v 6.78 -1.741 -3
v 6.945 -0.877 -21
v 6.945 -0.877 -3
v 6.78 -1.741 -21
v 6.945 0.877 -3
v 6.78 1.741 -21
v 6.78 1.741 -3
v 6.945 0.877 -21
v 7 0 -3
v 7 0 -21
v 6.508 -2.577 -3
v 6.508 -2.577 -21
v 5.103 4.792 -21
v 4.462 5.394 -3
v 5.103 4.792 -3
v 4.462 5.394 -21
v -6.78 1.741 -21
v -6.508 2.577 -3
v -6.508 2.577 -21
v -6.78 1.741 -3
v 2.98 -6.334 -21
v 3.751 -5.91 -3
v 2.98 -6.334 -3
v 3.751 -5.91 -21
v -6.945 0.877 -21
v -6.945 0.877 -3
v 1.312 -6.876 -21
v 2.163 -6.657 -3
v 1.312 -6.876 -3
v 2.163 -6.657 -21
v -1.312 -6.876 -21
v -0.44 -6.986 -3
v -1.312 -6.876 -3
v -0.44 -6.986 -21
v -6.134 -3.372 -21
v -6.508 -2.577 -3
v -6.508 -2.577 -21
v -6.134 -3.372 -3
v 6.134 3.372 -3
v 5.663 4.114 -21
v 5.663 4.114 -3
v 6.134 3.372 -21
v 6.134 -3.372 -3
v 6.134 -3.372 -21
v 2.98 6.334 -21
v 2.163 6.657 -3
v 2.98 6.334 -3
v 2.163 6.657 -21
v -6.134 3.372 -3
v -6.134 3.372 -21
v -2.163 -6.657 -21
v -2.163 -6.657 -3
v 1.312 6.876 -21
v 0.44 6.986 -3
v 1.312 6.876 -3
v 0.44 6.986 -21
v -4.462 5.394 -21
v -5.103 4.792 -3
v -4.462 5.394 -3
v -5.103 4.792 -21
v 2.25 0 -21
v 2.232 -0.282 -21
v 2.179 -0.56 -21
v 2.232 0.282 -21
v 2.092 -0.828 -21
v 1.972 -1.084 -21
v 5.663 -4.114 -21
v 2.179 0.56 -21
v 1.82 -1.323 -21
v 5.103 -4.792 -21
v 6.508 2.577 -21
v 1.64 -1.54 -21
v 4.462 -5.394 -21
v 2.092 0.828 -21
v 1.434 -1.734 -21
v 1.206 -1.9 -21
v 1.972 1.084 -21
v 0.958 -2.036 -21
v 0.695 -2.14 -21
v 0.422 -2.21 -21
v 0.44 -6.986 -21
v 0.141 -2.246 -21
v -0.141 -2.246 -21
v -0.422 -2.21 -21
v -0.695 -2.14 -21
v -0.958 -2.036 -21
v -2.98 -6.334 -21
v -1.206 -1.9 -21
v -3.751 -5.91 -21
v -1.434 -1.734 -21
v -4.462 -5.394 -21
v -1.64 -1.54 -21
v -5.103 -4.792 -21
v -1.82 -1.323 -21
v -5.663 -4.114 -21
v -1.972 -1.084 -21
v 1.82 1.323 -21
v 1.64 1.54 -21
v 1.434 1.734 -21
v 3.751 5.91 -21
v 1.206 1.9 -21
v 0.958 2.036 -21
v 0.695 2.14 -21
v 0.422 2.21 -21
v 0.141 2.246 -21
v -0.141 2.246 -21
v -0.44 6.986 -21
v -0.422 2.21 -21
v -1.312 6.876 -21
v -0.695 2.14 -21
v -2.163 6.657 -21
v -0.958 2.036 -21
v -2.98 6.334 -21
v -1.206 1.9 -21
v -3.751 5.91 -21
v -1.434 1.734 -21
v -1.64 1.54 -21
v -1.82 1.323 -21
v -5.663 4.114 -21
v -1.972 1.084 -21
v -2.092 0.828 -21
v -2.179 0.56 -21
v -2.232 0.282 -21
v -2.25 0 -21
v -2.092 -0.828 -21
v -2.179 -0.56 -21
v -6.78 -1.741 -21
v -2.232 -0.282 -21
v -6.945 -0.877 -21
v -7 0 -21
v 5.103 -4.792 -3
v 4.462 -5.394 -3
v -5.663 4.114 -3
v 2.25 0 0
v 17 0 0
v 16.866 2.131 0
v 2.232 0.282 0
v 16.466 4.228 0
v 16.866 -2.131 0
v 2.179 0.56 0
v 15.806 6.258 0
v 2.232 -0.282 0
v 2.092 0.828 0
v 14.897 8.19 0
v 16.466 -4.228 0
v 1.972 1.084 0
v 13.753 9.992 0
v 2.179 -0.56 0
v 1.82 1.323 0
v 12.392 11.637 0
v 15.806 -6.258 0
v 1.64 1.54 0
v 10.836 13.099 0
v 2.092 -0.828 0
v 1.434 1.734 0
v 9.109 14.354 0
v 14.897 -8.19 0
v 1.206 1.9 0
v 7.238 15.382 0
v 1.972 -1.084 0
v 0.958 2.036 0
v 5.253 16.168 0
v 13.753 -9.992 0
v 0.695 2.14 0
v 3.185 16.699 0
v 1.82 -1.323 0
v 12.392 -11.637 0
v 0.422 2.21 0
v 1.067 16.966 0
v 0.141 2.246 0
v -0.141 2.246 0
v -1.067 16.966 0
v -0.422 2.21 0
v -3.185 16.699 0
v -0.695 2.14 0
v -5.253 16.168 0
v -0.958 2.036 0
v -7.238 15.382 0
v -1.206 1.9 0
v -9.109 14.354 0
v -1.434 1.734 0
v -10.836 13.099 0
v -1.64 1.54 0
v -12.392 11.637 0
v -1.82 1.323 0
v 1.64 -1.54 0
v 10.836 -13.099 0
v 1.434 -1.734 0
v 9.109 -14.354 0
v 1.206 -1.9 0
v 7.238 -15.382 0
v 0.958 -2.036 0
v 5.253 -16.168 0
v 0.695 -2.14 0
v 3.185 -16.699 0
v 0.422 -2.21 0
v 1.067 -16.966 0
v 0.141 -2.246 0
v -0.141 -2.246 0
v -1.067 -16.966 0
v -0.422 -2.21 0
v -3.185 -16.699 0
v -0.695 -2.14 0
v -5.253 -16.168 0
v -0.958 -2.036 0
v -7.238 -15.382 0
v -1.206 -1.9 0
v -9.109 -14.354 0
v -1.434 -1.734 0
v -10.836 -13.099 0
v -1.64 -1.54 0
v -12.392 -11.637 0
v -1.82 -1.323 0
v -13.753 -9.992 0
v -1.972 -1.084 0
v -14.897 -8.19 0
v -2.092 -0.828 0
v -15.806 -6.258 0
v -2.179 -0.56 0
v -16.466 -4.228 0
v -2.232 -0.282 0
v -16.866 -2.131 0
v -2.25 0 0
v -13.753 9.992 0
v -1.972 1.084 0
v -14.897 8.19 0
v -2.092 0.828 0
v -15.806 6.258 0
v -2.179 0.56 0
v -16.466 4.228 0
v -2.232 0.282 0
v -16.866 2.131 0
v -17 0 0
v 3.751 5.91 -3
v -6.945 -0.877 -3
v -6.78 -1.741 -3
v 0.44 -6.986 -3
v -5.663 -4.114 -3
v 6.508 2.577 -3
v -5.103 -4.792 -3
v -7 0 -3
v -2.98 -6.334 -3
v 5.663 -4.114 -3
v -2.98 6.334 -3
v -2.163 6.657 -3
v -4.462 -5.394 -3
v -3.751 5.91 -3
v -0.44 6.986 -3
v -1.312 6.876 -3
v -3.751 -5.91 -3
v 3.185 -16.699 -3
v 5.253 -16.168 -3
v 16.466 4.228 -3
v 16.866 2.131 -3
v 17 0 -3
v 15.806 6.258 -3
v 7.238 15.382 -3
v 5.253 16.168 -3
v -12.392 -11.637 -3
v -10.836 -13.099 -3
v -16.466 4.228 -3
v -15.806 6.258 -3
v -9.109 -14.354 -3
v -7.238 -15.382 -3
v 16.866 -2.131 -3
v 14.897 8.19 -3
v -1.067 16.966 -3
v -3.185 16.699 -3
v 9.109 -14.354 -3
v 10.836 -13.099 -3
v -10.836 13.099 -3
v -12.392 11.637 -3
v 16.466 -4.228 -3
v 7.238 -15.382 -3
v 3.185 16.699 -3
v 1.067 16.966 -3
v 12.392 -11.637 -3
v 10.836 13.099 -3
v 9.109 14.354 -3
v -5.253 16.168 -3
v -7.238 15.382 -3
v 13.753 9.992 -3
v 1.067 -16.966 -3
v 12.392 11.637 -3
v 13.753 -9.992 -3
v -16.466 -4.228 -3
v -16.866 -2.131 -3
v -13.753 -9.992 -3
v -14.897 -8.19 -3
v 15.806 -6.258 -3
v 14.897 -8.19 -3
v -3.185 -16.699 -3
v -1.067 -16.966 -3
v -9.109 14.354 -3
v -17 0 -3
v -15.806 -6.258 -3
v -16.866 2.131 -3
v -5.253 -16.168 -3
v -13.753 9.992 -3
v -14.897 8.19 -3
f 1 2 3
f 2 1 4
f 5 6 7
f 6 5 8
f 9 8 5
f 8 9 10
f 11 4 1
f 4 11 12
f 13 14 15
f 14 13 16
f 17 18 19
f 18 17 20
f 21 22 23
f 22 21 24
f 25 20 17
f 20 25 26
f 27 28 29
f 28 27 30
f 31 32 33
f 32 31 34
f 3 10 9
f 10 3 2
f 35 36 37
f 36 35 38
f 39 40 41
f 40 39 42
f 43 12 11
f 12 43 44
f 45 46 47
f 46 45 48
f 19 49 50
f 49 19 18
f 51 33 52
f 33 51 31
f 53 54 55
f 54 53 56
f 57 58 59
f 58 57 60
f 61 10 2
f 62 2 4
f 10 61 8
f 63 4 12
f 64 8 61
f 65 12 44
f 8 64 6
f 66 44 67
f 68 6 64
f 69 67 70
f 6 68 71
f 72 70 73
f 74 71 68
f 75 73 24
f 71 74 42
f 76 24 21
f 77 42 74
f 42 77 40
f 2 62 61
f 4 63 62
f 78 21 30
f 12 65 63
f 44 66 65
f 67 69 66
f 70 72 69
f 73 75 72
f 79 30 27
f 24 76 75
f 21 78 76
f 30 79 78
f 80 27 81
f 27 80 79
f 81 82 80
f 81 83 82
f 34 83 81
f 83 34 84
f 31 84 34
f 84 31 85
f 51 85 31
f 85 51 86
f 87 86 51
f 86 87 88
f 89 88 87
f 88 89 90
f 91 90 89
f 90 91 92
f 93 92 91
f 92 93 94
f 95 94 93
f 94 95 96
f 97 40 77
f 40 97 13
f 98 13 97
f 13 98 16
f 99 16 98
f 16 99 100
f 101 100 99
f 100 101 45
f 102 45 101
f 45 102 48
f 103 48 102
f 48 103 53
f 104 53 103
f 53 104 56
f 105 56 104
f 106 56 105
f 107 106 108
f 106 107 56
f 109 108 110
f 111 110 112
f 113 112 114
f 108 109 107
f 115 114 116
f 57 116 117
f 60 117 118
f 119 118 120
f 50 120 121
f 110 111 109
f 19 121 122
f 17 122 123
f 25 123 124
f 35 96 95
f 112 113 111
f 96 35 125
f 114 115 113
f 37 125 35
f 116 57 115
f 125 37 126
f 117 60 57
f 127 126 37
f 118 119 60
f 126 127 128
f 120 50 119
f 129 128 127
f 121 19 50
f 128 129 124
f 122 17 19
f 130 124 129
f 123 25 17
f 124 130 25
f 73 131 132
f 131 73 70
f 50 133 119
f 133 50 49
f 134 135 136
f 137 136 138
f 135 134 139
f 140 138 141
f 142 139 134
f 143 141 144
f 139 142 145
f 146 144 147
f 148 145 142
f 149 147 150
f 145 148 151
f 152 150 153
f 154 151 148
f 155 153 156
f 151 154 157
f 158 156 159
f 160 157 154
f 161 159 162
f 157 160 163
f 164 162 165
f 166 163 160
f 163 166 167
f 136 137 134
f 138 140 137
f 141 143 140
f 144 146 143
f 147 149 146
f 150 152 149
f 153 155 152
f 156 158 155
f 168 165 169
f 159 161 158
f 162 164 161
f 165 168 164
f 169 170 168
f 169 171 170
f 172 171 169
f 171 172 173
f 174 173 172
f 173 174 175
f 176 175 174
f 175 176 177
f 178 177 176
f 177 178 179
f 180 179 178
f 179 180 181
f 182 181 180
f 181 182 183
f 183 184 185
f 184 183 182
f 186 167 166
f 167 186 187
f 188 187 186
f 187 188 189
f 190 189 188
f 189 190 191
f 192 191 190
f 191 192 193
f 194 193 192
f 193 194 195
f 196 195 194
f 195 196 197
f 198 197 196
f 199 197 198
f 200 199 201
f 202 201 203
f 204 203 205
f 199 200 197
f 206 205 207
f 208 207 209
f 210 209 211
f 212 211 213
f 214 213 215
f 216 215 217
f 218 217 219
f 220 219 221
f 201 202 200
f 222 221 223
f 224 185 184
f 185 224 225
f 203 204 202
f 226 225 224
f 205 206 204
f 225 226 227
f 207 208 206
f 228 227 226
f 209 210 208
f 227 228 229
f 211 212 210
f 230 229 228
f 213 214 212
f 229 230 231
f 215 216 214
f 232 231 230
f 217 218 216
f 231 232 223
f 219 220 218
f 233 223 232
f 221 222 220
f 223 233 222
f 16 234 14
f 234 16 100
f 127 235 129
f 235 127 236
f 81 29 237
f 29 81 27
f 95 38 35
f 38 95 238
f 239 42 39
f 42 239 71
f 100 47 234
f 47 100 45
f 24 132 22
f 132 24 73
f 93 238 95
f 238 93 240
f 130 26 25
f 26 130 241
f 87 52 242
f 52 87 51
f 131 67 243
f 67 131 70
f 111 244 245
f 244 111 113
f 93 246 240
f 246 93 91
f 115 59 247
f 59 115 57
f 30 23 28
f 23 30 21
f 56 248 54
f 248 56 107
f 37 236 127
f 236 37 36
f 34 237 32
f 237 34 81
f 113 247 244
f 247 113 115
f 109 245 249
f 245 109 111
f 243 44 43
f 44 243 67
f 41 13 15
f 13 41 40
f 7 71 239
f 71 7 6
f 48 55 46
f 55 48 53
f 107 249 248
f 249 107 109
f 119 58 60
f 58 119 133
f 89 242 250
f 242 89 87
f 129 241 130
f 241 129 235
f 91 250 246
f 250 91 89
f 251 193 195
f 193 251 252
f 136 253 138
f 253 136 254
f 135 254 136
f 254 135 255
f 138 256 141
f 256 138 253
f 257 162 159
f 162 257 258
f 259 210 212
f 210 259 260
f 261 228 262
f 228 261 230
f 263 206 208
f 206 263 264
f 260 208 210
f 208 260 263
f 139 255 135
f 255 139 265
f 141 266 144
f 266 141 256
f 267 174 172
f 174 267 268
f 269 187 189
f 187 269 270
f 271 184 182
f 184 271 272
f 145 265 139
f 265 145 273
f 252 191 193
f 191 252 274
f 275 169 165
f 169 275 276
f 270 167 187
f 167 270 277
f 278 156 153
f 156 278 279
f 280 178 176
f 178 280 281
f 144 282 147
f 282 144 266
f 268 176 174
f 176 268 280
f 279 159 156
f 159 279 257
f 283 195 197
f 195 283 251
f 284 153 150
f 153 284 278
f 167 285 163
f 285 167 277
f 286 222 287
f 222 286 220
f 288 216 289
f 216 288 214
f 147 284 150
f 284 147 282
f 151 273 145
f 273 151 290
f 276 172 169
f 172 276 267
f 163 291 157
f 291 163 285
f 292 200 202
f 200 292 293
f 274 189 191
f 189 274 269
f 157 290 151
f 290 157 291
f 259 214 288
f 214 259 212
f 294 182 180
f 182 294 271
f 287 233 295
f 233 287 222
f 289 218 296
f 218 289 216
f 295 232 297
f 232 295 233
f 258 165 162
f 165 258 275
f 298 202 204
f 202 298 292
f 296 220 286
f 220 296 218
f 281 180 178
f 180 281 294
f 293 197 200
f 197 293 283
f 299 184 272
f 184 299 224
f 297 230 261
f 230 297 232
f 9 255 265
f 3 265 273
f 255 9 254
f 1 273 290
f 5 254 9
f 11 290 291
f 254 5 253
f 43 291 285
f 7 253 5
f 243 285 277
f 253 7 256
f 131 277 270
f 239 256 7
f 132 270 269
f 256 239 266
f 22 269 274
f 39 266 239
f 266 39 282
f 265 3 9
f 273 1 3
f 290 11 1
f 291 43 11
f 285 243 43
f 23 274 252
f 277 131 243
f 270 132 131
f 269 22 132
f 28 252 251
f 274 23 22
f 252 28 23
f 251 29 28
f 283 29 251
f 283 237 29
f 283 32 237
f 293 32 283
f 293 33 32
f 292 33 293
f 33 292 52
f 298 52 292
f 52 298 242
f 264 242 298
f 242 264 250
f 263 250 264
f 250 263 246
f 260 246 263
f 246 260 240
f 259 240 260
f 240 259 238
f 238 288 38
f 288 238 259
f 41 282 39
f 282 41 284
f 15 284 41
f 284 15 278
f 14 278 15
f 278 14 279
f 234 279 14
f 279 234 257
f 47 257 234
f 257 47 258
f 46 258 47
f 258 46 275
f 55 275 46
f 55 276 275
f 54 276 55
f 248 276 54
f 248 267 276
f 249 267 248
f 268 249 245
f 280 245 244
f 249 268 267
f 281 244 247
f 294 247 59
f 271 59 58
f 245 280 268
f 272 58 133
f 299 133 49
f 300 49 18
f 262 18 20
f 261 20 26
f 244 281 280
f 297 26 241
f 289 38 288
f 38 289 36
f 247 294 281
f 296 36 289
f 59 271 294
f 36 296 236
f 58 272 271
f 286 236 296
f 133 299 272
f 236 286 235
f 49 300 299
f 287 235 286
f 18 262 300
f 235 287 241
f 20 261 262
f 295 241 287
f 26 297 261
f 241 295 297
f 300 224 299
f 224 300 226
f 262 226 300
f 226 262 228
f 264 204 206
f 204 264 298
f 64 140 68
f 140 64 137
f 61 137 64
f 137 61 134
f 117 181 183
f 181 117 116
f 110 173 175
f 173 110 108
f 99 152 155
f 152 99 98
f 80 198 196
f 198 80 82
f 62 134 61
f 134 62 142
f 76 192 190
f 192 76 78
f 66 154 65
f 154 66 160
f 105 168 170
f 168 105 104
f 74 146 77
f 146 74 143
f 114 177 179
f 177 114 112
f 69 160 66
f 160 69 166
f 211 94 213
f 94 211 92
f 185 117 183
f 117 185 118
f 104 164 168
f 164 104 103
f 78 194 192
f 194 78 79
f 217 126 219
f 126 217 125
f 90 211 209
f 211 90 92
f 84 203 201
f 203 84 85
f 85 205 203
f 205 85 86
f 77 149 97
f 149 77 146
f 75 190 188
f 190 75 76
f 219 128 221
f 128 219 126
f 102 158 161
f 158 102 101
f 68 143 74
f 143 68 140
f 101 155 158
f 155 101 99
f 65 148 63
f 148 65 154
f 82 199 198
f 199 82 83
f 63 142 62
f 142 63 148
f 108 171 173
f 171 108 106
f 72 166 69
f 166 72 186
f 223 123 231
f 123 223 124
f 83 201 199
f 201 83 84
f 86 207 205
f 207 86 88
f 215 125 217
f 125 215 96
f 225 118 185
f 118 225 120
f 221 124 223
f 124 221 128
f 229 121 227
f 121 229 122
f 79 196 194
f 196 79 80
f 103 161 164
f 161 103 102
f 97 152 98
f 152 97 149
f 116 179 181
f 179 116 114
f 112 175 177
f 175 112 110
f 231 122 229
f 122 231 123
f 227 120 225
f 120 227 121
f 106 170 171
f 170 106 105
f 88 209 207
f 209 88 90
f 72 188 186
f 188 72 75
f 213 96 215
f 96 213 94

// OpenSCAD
$fn = 50;


difference() {
	union() {
		translate(v = [0, 0, -21.0000000000]) {
			cylinder(h = 21, r = 7.0000000000);
		}
		translate(v = [0, 0, -3.0000000000]) {
			cylinder(h = 3, r = 17.0000000000);
		}
	}
	union() {
		#translate(v = [0, 0, -21]) {
			cylinder(h = 21, r = 2.2500000000);
		}
	}
}
